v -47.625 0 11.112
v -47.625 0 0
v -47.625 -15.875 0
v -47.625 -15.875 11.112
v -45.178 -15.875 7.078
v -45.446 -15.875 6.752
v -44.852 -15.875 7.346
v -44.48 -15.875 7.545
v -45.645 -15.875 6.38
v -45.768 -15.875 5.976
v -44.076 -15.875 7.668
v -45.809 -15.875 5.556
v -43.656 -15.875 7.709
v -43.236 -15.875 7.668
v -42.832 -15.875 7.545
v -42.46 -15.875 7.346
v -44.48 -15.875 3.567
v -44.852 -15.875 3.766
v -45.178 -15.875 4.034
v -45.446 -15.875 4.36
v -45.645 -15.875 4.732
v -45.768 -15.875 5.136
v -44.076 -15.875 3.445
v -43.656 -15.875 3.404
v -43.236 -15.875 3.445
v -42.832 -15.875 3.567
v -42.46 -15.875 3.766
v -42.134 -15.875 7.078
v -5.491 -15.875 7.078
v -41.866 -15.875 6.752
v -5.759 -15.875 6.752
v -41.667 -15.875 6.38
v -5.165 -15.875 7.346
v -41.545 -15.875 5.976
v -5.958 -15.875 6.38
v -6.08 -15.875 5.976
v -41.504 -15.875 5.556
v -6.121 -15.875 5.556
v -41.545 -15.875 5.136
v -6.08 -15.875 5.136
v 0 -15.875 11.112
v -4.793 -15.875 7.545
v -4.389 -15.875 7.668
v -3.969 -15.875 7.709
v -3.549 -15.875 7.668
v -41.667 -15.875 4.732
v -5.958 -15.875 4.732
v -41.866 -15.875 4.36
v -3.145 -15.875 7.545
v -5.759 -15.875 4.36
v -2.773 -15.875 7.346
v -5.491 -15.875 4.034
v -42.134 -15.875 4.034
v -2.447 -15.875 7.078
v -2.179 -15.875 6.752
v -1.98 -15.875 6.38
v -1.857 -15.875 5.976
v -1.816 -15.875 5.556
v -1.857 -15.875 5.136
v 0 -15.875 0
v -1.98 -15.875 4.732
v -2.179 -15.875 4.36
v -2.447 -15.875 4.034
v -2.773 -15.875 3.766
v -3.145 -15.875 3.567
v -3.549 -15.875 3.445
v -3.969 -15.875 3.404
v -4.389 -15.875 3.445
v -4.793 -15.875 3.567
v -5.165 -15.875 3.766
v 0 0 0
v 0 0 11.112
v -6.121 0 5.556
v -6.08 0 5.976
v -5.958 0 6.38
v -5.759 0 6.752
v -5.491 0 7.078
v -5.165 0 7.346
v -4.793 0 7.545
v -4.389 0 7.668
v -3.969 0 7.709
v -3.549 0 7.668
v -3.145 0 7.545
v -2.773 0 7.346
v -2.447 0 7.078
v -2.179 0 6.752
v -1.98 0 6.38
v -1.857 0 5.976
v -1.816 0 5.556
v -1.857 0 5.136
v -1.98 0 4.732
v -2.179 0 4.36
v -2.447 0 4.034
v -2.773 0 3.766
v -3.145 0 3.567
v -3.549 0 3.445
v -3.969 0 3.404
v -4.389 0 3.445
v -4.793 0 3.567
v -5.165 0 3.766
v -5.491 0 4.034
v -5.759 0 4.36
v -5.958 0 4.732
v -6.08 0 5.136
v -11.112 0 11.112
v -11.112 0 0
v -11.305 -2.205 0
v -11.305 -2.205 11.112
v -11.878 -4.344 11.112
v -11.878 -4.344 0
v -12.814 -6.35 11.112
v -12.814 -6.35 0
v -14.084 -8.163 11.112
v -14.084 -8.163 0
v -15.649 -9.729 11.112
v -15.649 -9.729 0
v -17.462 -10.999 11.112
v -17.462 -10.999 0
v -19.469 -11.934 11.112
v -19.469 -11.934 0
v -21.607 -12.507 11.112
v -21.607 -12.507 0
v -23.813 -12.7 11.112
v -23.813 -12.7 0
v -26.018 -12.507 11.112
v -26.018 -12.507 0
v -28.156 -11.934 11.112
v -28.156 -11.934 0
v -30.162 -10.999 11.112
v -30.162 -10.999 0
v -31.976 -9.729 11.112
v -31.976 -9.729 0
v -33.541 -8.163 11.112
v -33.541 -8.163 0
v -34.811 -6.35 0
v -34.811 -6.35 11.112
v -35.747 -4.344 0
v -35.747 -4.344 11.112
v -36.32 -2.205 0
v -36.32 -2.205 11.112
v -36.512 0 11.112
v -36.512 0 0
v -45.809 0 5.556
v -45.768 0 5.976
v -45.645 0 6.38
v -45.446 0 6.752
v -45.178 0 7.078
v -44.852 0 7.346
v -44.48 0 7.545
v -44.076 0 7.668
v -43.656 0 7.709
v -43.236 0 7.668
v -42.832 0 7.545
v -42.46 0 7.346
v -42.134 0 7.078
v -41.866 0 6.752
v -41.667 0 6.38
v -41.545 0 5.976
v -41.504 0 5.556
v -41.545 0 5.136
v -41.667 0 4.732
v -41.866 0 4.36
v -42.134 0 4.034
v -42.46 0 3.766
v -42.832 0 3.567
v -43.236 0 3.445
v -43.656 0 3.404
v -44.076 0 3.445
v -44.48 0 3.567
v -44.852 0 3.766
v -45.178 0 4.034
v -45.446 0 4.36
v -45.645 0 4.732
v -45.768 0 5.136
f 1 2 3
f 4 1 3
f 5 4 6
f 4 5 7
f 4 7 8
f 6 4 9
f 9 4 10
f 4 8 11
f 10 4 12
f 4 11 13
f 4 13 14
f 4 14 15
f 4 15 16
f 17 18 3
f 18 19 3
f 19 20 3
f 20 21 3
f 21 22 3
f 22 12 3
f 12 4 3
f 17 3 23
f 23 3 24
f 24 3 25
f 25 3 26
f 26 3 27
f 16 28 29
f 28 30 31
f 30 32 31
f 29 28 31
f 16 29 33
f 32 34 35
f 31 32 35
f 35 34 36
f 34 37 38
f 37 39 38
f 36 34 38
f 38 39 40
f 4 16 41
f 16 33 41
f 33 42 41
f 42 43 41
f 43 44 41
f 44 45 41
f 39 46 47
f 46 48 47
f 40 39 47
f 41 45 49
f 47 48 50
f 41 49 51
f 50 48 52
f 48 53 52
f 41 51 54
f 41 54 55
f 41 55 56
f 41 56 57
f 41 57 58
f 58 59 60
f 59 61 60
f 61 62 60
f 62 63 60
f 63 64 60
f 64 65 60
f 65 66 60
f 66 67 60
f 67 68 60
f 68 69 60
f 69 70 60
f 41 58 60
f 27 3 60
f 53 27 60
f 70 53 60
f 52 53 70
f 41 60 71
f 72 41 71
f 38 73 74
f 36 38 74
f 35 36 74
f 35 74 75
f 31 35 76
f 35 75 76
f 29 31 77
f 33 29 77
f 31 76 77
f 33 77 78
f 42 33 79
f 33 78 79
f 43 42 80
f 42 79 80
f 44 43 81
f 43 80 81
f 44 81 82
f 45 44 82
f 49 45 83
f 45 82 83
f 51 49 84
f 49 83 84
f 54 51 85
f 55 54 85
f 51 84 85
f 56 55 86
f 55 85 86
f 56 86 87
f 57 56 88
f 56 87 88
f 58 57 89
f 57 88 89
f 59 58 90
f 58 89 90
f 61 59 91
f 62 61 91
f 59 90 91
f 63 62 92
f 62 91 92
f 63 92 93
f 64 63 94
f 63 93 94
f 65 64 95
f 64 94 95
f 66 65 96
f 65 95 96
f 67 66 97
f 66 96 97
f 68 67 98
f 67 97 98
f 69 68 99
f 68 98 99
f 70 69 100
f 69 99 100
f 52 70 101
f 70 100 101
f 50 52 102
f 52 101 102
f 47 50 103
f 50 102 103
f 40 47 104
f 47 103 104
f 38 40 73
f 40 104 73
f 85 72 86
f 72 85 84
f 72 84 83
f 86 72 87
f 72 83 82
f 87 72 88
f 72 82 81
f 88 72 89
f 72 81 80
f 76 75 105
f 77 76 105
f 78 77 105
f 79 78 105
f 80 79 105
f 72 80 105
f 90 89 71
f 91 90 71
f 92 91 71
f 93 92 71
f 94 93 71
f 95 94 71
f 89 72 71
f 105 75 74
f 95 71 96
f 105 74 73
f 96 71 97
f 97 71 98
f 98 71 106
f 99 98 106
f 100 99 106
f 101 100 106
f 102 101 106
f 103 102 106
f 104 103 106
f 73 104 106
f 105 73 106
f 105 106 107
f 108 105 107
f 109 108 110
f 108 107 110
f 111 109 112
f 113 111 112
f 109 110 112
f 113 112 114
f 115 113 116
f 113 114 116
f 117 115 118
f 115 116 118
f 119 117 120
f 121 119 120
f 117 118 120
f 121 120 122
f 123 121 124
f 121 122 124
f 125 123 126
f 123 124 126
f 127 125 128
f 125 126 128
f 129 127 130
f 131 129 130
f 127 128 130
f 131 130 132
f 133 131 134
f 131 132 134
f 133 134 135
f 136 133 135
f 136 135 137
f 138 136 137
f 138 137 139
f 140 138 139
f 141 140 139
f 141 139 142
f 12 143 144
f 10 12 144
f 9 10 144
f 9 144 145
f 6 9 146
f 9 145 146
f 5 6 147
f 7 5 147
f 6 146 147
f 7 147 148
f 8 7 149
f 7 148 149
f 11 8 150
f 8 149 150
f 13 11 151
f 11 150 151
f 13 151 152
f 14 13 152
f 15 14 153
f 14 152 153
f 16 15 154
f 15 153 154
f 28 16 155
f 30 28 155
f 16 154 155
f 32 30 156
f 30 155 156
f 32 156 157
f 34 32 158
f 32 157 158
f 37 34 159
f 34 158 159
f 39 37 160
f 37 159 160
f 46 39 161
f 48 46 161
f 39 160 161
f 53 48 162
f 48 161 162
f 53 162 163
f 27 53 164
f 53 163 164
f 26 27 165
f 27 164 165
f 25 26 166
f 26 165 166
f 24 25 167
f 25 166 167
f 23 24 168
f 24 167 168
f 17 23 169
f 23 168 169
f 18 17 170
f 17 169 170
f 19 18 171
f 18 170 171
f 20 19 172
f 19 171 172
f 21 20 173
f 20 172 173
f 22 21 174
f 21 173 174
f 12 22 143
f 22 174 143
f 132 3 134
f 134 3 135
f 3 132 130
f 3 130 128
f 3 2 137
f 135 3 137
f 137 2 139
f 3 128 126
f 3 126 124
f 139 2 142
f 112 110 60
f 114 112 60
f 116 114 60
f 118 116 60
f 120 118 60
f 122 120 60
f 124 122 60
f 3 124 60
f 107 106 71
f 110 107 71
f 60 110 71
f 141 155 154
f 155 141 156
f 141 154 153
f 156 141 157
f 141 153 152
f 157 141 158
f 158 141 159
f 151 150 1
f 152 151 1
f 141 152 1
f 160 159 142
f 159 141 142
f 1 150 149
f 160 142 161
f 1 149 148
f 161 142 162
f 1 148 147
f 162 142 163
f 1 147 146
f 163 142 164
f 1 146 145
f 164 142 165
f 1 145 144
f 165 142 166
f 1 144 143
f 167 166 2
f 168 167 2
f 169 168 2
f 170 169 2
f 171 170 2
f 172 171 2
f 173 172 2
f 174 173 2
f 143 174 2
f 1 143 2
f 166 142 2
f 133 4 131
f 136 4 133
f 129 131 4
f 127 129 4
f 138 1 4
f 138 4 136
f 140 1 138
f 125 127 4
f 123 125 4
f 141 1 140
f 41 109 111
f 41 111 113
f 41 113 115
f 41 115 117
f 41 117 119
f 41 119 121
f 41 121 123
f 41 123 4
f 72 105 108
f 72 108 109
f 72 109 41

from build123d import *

# Parameters (mm, degrees)
F1_DEPTH = 11.1125
F2_R     = 2.15265
F3_DEPTH = 15.875


with BuildPart() as f1:
    # F0 (on Top) → F1 (new body)
    with BuildSketch(Plane.XY):
        with BuildLine():
            Line((-47.625, -15.875), (0, -15.875))
            Line((0, -15.875), (0, 0))
            Line((0, 0), (-11.1125, 0))
            ThreePointArc((-11.1125, 0), (-23.8125, -12.7), (-36.5125, 0))
            Line((-36.5125, 0), (-47.625, 0))
            Line((-47.625, 0), (-47.625, -15.875))
        make_face()
    extrude(amount=F1_DEPTH)

    # F2 (on face) → F3 (cut, through all)
    with BuildSketch(Plane(origin=(0, 0, 0), x_dir=(-1, 0, 0), z_dir=(0, 1, 0))):
        with Locations((43.65625, 5.55625)):
            Circle(F2_R)
        with Locations((3.96875, 5.55625)):
            Circle(F2_R)
    extrude(amount=-F3_DEPTH, mode=Mode.SUBTRACT)


solid = f1.part
